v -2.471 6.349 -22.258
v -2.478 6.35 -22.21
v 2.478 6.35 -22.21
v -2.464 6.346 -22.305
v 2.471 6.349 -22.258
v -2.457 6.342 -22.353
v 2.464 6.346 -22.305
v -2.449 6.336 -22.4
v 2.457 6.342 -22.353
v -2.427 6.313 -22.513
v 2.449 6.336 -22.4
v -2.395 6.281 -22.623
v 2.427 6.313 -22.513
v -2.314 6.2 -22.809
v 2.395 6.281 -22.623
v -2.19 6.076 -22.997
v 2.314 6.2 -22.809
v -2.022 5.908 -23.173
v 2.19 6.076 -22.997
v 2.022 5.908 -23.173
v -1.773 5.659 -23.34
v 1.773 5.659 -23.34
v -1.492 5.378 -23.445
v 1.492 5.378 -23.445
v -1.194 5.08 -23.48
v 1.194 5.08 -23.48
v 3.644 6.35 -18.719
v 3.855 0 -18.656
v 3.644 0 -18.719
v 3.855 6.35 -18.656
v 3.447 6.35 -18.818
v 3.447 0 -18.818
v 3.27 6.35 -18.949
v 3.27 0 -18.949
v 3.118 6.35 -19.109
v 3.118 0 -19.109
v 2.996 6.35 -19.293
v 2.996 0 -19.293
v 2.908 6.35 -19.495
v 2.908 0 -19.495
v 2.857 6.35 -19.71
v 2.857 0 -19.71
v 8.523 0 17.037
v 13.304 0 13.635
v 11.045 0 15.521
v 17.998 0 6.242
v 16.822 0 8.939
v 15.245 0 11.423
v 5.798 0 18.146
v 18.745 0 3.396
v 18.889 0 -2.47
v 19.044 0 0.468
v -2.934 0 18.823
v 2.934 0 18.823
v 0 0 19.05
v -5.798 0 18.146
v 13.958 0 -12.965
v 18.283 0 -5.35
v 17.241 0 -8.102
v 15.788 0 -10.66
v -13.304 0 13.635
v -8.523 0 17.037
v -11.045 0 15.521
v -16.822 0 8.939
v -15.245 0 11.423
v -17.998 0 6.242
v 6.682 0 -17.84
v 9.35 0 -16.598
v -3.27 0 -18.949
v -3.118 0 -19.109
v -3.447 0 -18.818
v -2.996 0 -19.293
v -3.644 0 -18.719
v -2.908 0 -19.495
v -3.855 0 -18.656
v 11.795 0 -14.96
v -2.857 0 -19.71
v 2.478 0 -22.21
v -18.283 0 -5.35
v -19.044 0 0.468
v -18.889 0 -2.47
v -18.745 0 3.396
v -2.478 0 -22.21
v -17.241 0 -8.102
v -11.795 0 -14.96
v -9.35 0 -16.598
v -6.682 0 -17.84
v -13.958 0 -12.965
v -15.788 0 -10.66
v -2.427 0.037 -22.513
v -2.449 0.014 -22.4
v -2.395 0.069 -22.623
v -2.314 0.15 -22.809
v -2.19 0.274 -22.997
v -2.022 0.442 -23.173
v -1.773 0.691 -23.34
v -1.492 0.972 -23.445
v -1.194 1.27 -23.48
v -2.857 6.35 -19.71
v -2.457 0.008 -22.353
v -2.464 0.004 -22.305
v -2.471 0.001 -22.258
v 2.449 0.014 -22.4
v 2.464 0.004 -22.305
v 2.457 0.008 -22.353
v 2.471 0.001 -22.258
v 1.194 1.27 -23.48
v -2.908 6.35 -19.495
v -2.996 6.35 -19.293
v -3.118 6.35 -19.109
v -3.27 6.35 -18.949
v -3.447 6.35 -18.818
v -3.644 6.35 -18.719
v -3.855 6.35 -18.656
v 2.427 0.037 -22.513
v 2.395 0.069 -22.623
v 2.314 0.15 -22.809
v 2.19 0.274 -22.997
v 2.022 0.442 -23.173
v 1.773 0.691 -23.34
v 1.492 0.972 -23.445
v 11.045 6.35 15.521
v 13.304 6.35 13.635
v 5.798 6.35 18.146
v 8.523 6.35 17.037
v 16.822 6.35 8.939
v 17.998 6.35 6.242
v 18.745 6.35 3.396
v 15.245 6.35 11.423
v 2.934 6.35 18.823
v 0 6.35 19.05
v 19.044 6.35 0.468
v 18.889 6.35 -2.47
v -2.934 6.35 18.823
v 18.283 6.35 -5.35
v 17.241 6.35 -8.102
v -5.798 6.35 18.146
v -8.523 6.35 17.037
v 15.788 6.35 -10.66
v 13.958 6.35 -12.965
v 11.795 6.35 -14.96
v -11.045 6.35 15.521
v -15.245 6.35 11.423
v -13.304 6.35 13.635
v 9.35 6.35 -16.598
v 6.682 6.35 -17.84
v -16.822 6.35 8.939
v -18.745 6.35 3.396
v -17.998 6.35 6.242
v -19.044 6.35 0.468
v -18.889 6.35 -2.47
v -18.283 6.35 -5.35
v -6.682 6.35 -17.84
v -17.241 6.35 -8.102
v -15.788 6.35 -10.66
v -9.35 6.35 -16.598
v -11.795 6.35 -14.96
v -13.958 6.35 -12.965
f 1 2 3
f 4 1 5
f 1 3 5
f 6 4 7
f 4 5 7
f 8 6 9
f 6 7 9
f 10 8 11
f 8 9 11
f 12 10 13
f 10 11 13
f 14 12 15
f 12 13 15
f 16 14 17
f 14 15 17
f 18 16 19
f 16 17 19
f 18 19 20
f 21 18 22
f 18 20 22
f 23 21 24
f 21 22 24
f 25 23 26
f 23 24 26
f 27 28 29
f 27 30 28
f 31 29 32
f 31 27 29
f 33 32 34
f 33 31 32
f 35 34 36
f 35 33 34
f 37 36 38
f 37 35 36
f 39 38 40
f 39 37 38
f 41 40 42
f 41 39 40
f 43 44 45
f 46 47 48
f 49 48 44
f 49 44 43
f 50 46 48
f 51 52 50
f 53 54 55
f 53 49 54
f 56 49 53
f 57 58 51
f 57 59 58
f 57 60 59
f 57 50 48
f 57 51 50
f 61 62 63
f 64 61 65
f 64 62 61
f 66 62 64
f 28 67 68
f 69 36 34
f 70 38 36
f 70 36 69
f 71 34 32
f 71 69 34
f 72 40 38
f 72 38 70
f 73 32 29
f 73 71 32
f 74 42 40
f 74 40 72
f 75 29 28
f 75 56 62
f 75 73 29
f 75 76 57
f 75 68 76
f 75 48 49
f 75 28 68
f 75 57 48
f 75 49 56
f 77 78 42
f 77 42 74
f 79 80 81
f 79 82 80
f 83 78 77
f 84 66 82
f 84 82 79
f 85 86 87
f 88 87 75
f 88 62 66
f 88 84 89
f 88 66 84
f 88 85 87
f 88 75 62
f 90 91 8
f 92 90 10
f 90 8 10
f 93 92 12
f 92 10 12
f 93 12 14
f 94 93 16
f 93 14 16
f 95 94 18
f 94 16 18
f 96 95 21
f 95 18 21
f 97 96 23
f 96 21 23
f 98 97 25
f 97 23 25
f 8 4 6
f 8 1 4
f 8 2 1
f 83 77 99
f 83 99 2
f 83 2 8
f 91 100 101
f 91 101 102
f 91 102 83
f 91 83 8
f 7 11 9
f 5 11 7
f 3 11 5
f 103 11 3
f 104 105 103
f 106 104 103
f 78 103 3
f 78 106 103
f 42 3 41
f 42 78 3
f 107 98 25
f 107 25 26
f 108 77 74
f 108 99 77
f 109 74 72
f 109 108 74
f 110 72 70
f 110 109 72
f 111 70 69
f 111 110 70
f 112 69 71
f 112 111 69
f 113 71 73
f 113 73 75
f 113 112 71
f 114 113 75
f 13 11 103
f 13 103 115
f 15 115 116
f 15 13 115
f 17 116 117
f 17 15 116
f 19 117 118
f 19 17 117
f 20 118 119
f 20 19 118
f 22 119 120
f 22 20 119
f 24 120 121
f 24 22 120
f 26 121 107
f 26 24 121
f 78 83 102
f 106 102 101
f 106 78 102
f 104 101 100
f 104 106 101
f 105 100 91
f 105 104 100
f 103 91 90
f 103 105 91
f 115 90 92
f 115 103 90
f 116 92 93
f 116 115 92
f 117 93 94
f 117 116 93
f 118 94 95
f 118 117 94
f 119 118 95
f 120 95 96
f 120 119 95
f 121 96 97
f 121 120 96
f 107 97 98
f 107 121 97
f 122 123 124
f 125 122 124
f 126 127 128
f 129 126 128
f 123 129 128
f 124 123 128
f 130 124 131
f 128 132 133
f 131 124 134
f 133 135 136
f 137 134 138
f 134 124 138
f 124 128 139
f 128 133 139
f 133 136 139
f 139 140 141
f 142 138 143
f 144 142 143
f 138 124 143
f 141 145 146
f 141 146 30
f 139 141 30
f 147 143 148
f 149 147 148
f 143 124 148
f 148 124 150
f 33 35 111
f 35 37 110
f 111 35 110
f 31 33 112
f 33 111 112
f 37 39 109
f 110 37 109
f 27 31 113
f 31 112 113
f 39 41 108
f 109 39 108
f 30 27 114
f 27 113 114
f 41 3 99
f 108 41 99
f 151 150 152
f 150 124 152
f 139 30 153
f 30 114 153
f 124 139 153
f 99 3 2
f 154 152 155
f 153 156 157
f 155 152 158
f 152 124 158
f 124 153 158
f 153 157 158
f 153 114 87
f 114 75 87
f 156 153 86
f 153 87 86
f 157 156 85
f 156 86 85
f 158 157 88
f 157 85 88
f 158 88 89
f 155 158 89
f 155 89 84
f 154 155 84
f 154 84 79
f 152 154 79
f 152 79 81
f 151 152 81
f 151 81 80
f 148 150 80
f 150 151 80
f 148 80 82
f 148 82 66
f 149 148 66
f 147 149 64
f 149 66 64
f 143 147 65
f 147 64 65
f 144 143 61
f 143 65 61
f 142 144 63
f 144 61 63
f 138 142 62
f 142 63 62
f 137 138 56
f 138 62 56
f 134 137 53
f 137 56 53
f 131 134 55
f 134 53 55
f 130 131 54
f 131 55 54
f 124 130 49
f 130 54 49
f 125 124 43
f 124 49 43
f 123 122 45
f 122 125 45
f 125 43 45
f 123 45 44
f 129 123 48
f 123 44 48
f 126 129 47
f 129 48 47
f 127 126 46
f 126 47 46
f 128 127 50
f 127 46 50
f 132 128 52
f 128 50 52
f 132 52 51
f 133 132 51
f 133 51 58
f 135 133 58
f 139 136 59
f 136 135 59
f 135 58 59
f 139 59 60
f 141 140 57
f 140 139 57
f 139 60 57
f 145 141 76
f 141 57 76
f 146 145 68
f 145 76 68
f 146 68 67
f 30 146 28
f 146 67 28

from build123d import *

# Parameters (mm, degrees)
SKETCH1_R           = 19.05
BOSS_EXTRUDE1_DEPTH = 6.35
BOSS_EXTRUDE2_DEPTH = 6.35
FILLET13_R          = 1.27
FILLET15_R          = 1.27


with BuildPart() as part:
    # Sketch1 → Boss-Extrude1 (new body)
    with BuildSketch(Plane(origin=(0, 0, 0), x_dir=(1, 0, 0), z_dir=(0, 1, 0))):
        with Locations(Location((0, 0, 0), (0, 0, 270))):
            Circle(SKETCH1_R)
    extrude(amount=BOSS_EXTRUDE1_DEPTH)

    # Sketch2 → Boss-Extrude2 (add)
    with BuildSketch(Plane(origin=(0, 0, 0), x_dir=(1, 0, 0), z_dir=(0, 1, 0))):
        Polygon((-2.992120362, 18.813551386), (-2.286000743, 23.480131449), (2.285999257, 23.480131449), (2.992119638, 18.813551501), align=None)
    extrude(amount=BOSS_EXTRUDE2_DEPTH)

    # Fillet13
    fillet13_edges = [part.edges().sort_by_distance(p)[0] for p in [
        (2.285999257, 3.175, -23.480131449),
        (-2.286000743, 3.175, -23.480131449),
        (-7.43e-07, 0, -23.480131449),
        (-7.43e-07, 6.35, -23.480131449),
    ]]
    fillet(fillet13_edges, radius=FILLET13_R)

    # Fillet15
    fillet15_edges = [part.edges().sort_by_distance(p)[0] for p in [
        (-2.992120362, 3.175, -18.813551386),
        (2.992119638, 3.175, -18.813551501),
    ]]
    fillet(fillet15_edges, radius=FILLET15_R)


solid = part.part
